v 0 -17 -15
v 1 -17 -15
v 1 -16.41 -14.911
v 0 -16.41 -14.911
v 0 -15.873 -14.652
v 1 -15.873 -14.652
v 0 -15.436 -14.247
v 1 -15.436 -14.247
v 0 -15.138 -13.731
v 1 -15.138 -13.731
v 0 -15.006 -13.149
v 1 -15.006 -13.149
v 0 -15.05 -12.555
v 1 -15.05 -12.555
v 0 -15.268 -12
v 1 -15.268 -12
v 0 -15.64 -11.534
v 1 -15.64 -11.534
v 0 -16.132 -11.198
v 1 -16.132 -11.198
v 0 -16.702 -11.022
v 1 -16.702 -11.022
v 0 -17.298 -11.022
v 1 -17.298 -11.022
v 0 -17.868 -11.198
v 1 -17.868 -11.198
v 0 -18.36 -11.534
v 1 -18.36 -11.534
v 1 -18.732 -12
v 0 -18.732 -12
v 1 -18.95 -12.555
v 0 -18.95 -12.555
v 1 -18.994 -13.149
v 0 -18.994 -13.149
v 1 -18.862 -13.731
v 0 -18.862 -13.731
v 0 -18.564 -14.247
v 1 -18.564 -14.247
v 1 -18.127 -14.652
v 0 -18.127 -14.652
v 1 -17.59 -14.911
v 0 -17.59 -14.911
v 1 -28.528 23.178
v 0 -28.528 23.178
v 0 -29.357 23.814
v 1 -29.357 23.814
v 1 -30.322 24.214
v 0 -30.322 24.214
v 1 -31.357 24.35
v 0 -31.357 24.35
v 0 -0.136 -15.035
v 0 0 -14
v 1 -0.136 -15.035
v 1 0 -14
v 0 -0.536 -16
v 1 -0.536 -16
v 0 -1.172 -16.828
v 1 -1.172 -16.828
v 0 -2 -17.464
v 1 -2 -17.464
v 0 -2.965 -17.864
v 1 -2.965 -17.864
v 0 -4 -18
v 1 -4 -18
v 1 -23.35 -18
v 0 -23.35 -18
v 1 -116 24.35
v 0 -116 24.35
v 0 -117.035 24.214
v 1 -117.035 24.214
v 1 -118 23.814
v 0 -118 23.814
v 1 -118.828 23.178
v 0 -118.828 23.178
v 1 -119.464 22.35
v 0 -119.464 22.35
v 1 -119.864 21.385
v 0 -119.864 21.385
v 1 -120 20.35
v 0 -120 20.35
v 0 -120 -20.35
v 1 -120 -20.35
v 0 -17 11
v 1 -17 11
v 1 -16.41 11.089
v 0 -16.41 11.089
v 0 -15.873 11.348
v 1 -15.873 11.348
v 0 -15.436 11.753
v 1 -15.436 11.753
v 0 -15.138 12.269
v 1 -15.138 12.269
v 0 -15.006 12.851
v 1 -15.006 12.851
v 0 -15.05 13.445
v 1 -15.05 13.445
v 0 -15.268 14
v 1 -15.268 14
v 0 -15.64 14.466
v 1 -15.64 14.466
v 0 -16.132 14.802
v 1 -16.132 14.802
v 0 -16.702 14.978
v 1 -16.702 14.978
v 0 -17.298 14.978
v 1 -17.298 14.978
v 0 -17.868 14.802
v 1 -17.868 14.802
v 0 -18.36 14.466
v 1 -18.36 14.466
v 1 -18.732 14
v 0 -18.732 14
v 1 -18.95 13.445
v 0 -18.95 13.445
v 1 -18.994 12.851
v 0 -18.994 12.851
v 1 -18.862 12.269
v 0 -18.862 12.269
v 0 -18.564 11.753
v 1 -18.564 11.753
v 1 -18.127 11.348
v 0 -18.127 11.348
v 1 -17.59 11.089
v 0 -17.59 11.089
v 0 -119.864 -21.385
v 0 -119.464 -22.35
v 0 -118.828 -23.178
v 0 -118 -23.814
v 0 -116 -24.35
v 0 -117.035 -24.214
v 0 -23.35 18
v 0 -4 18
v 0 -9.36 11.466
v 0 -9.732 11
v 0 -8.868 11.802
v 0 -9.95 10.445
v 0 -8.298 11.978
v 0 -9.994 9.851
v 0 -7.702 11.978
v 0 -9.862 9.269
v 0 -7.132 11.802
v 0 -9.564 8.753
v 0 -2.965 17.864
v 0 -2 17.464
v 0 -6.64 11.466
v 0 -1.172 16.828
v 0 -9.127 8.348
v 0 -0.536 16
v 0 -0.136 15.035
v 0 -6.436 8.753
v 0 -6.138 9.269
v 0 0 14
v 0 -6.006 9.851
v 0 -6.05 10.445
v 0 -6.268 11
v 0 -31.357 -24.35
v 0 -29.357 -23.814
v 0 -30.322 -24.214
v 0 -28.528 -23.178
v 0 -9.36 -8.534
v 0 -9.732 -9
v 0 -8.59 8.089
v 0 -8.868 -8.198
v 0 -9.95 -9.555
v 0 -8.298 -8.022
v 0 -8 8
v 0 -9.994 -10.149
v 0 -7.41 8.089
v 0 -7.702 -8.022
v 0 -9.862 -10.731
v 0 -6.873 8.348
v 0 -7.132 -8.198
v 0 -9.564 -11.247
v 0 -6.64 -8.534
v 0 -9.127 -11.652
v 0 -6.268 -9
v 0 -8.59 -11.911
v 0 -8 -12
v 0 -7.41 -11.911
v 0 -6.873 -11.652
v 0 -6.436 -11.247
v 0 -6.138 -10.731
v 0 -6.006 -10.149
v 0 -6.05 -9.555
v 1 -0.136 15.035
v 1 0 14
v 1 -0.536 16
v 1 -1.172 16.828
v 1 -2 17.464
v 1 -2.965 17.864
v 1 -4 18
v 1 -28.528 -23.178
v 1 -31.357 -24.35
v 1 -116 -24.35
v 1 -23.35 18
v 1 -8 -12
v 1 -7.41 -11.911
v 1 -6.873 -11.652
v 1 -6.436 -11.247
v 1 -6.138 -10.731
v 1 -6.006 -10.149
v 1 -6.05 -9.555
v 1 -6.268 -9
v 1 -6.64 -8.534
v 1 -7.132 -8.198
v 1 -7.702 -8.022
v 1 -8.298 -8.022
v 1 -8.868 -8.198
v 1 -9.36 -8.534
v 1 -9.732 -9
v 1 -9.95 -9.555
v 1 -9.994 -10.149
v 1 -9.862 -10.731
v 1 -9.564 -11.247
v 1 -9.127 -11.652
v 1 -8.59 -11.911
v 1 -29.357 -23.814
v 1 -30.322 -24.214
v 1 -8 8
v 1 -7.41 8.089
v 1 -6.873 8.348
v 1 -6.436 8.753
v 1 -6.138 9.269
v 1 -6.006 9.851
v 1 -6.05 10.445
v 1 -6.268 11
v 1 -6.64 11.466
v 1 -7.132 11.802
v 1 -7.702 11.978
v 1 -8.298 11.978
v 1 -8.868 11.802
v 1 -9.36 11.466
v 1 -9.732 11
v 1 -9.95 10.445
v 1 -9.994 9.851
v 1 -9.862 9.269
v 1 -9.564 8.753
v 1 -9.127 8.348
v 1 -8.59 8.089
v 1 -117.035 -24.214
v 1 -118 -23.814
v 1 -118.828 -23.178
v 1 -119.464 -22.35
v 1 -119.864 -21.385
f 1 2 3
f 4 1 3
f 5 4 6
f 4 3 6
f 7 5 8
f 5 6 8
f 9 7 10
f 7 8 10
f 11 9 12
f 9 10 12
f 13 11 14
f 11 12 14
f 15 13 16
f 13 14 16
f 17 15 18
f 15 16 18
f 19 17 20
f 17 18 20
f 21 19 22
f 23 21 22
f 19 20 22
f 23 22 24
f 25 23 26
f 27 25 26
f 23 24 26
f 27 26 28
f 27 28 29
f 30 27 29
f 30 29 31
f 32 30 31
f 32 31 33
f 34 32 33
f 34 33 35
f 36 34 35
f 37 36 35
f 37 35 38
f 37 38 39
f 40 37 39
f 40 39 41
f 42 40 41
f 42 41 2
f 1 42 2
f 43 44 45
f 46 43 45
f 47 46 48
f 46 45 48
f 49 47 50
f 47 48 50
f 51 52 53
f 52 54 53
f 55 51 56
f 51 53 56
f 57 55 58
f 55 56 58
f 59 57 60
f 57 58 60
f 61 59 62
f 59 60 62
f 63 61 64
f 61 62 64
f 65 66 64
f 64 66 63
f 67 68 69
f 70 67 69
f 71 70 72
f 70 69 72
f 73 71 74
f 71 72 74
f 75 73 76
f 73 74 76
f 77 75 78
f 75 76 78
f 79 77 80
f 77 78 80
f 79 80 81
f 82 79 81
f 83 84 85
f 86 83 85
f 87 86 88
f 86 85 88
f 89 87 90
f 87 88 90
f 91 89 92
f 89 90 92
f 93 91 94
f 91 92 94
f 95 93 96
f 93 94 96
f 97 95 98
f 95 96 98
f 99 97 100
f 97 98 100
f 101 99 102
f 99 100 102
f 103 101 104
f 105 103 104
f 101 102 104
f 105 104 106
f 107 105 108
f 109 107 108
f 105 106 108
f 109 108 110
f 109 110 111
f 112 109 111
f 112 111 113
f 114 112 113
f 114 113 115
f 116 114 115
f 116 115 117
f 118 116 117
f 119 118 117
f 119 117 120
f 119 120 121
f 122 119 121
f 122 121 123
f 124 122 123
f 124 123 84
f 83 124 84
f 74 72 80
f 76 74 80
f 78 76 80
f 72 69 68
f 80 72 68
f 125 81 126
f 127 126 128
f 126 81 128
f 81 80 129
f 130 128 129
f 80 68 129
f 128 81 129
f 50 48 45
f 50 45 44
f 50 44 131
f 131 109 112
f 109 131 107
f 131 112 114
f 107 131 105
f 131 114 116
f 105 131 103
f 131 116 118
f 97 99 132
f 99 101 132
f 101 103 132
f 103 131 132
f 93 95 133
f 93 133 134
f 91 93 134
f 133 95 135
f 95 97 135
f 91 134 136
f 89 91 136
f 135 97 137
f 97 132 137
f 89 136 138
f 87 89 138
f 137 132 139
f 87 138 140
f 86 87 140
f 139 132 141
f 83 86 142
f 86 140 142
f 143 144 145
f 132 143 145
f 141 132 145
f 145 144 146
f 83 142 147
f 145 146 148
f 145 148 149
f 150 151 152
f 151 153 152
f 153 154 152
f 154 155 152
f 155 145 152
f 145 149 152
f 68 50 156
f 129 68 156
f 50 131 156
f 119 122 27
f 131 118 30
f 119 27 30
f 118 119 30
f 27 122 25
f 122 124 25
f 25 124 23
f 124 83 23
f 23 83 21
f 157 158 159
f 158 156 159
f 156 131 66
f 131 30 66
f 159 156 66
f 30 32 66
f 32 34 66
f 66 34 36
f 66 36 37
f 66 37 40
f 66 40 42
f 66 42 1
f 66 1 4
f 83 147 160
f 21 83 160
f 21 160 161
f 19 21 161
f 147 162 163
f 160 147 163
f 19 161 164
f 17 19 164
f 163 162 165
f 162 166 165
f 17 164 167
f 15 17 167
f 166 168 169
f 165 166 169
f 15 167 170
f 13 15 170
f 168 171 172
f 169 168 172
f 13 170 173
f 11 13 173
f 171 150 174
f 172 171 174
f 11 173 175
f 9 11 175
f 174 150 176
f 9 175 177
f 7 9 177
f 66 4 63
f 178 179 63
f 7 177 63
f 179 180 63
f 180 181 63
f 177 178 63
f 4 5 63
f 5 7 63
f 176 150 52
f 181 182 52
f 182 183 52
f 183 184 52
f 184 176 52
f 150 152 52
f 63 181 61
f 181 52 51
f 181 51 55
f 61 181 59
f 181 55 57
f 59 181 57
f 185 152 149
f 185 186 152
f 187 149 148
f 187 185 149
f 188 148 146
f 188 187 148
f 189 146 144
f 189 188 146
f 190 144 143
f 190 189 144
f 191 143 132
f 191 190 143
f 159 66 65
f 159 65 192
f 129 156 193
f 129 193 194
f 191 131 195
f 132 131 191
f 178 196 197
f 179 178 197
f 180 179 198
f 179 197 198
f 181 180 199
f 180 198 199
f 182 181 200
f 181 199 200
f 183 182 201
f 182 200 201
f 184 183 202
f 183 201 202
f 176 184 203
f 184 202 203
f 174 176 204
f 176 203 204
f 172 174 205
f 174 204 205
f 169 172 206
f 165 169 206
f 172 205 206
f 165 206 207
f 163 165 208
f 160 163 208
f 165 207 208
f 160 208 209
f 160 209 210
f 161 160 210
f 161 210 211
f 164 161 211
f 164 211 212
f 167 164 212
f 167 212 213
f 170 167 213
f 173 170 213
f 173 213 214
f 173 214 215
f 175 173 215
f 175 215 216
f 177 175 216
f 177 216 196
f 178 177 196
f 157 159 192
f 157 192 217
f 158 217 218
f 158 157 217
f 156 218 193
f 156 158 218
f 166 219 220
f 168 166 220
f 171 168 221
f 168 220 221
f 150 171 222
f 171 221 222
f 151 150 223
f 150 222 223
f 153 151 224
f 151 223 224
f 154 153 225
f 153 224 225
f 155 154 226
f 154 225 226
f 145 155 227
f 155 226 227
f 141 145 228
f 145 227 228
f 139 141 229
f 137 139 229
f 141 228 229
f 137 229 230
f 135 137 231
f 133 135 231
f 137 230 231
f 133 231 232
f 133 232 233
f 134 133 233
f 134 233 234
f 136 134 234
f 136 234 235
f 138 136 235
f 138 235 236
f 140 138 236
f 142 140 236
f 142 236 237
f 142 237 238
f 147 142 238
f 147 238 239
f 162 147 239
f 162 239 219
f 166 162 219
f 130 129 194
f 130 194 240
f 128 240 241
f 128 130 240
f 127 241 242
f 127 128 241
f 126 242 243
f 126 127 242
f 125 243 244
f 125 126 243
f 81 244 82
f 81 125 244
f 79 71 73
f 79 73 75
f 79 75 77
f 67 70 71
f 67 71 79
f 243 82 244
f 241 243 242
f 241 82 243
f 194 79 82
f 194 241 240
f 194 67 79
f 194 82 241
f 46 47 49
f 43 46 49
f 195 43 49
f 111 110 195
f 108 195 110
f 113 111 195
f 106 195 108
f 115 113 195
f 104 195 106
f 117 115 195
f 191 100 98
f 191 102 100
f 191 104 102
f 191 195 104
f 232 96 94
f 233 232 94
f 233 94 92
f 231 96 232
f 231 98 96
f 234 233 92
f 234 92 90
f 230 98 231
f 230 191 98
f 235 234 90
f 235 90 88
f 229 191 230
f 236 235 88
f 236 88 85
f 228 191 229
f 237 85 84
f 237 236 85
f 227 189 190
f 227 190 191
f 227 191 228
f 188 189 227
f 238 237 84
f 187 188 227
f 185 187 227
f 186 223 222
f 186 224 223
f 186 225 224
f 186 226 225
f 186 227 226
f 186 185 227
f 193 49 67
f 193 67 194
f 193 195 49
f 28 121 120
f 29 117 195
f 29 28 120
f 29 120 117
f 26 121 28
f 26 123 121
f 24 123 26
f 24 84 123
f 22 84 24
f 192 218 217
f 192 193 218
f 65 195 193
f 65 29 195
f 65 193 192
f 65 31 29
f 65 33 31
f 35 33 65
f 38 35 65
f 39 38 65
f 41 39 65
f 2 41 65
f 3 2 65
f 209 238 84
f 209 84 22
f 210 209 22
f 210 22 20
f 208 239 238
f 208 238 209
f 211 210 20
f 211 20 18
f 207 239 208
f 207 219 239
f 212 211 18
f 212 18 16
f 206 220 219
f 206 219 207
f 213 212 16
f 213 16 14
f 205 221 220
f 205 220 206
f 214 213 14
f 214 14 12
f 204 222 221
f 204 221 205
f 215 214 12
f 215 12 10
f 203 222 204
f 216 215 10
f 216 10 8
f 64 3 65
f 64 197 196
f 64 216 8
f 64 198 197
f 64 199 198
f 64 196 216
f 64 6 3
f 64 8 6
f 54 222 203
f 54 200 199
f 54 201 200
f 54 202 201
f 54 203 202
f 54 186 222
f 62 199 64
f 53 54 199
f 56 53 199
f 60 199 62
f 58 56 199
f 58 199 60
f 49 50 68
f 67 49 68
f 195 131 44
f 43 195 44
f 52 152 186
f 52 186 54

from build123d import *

# Parameters (mm, degrees)
SKETCH1_W                = 36
SKETCH1_H                = 120
BOSS_EXTRUDE1_DEPTH      = 1
F_4_0_4_DIAMETER_HOLE2_D = 4
F_4_0_4_DIAMETER_HOLE3_D = 4
BOSS_EXTRUDE2_DEPTH      = 1
FILLET1_R                = 4


with BuildPart() as part:
    # Sketch1 → Boss-Extrude1 (new body)
    with BuildSketch(Plane(origin=(0, 0, 0), x_dir=(0, 0, -1), z_dir=(1, 0, 0))):
        with Locations((0, -60)):
            Rectangle(SKETCH1_W, SKETCH1_H)
    extrude(amount=BOSS_EXTRUDE1_DEPTH)

    # Ø4.0 (4) Diameter Hole2 (through all)
    with Locations(Plane.ZY):
        with Locations((-10, -8), (10, -8)):
            Hole(F_4_0_4_DIAMETER_HOLE2_D / 2)

    # Ø4.0 (4) Diameter Hole3 (through all)
    with Locations(Plane.ZY):
        with Locations((-13, -17), (13, -17)):
            Hole(F_4_0_4_DIAMETER_HOLE3_D / 2)

    # Sketch9 → Boss-Extrude2 (add)
    with BuildSketch(Plane.ZY):
        with BuildLine():
            Line((18, -23.35), (23.178427125, -28.528427125))
            ThreePointArc((23.178427125, -28.528427125), (24.04551813, -29.82612052), (24.35, -31.356854249))
            Line((24.35, -31.356854249), (24.35, -116))
            ThreePointArc((24.35, -116), (23.178427125, -118.828427125), (20.35, -120))
            Line((20.35, -120), (18, -120))
            Line((18, -120), (18, -23.35))
        make_face()
        with BuildLine():
            Line((-18, -23.35), (-23.178427125, -28.528427125))
            ThreePointArc((-23.178427125, -28.528427125), (-24.04551813, -29.82612052), (-24.35, -31.356854249))
            Line((-24.35, -31.356854249), (-24.35, -116))
            ThreePointArc((-24.35, -116), (-23.178427125, -118.828427125), (-20.35, -120))
            Line((-20.35, -120), (-18, -120))
            Line((-18, -120), (-18, -23.35))
        make_face()
    extrude(amount=-BOSS_EXTRUDE2_DEPTH)

    # Fillet1
    fillet1_edges = [part.edges().sort_by_distance(p)[0] for p in [
        (0.5, 0, 18),
        (0.5, 0, -18),
    ]]
    fillet(fillet1_edges, radius=FILLET1_R)


solid = part.part
